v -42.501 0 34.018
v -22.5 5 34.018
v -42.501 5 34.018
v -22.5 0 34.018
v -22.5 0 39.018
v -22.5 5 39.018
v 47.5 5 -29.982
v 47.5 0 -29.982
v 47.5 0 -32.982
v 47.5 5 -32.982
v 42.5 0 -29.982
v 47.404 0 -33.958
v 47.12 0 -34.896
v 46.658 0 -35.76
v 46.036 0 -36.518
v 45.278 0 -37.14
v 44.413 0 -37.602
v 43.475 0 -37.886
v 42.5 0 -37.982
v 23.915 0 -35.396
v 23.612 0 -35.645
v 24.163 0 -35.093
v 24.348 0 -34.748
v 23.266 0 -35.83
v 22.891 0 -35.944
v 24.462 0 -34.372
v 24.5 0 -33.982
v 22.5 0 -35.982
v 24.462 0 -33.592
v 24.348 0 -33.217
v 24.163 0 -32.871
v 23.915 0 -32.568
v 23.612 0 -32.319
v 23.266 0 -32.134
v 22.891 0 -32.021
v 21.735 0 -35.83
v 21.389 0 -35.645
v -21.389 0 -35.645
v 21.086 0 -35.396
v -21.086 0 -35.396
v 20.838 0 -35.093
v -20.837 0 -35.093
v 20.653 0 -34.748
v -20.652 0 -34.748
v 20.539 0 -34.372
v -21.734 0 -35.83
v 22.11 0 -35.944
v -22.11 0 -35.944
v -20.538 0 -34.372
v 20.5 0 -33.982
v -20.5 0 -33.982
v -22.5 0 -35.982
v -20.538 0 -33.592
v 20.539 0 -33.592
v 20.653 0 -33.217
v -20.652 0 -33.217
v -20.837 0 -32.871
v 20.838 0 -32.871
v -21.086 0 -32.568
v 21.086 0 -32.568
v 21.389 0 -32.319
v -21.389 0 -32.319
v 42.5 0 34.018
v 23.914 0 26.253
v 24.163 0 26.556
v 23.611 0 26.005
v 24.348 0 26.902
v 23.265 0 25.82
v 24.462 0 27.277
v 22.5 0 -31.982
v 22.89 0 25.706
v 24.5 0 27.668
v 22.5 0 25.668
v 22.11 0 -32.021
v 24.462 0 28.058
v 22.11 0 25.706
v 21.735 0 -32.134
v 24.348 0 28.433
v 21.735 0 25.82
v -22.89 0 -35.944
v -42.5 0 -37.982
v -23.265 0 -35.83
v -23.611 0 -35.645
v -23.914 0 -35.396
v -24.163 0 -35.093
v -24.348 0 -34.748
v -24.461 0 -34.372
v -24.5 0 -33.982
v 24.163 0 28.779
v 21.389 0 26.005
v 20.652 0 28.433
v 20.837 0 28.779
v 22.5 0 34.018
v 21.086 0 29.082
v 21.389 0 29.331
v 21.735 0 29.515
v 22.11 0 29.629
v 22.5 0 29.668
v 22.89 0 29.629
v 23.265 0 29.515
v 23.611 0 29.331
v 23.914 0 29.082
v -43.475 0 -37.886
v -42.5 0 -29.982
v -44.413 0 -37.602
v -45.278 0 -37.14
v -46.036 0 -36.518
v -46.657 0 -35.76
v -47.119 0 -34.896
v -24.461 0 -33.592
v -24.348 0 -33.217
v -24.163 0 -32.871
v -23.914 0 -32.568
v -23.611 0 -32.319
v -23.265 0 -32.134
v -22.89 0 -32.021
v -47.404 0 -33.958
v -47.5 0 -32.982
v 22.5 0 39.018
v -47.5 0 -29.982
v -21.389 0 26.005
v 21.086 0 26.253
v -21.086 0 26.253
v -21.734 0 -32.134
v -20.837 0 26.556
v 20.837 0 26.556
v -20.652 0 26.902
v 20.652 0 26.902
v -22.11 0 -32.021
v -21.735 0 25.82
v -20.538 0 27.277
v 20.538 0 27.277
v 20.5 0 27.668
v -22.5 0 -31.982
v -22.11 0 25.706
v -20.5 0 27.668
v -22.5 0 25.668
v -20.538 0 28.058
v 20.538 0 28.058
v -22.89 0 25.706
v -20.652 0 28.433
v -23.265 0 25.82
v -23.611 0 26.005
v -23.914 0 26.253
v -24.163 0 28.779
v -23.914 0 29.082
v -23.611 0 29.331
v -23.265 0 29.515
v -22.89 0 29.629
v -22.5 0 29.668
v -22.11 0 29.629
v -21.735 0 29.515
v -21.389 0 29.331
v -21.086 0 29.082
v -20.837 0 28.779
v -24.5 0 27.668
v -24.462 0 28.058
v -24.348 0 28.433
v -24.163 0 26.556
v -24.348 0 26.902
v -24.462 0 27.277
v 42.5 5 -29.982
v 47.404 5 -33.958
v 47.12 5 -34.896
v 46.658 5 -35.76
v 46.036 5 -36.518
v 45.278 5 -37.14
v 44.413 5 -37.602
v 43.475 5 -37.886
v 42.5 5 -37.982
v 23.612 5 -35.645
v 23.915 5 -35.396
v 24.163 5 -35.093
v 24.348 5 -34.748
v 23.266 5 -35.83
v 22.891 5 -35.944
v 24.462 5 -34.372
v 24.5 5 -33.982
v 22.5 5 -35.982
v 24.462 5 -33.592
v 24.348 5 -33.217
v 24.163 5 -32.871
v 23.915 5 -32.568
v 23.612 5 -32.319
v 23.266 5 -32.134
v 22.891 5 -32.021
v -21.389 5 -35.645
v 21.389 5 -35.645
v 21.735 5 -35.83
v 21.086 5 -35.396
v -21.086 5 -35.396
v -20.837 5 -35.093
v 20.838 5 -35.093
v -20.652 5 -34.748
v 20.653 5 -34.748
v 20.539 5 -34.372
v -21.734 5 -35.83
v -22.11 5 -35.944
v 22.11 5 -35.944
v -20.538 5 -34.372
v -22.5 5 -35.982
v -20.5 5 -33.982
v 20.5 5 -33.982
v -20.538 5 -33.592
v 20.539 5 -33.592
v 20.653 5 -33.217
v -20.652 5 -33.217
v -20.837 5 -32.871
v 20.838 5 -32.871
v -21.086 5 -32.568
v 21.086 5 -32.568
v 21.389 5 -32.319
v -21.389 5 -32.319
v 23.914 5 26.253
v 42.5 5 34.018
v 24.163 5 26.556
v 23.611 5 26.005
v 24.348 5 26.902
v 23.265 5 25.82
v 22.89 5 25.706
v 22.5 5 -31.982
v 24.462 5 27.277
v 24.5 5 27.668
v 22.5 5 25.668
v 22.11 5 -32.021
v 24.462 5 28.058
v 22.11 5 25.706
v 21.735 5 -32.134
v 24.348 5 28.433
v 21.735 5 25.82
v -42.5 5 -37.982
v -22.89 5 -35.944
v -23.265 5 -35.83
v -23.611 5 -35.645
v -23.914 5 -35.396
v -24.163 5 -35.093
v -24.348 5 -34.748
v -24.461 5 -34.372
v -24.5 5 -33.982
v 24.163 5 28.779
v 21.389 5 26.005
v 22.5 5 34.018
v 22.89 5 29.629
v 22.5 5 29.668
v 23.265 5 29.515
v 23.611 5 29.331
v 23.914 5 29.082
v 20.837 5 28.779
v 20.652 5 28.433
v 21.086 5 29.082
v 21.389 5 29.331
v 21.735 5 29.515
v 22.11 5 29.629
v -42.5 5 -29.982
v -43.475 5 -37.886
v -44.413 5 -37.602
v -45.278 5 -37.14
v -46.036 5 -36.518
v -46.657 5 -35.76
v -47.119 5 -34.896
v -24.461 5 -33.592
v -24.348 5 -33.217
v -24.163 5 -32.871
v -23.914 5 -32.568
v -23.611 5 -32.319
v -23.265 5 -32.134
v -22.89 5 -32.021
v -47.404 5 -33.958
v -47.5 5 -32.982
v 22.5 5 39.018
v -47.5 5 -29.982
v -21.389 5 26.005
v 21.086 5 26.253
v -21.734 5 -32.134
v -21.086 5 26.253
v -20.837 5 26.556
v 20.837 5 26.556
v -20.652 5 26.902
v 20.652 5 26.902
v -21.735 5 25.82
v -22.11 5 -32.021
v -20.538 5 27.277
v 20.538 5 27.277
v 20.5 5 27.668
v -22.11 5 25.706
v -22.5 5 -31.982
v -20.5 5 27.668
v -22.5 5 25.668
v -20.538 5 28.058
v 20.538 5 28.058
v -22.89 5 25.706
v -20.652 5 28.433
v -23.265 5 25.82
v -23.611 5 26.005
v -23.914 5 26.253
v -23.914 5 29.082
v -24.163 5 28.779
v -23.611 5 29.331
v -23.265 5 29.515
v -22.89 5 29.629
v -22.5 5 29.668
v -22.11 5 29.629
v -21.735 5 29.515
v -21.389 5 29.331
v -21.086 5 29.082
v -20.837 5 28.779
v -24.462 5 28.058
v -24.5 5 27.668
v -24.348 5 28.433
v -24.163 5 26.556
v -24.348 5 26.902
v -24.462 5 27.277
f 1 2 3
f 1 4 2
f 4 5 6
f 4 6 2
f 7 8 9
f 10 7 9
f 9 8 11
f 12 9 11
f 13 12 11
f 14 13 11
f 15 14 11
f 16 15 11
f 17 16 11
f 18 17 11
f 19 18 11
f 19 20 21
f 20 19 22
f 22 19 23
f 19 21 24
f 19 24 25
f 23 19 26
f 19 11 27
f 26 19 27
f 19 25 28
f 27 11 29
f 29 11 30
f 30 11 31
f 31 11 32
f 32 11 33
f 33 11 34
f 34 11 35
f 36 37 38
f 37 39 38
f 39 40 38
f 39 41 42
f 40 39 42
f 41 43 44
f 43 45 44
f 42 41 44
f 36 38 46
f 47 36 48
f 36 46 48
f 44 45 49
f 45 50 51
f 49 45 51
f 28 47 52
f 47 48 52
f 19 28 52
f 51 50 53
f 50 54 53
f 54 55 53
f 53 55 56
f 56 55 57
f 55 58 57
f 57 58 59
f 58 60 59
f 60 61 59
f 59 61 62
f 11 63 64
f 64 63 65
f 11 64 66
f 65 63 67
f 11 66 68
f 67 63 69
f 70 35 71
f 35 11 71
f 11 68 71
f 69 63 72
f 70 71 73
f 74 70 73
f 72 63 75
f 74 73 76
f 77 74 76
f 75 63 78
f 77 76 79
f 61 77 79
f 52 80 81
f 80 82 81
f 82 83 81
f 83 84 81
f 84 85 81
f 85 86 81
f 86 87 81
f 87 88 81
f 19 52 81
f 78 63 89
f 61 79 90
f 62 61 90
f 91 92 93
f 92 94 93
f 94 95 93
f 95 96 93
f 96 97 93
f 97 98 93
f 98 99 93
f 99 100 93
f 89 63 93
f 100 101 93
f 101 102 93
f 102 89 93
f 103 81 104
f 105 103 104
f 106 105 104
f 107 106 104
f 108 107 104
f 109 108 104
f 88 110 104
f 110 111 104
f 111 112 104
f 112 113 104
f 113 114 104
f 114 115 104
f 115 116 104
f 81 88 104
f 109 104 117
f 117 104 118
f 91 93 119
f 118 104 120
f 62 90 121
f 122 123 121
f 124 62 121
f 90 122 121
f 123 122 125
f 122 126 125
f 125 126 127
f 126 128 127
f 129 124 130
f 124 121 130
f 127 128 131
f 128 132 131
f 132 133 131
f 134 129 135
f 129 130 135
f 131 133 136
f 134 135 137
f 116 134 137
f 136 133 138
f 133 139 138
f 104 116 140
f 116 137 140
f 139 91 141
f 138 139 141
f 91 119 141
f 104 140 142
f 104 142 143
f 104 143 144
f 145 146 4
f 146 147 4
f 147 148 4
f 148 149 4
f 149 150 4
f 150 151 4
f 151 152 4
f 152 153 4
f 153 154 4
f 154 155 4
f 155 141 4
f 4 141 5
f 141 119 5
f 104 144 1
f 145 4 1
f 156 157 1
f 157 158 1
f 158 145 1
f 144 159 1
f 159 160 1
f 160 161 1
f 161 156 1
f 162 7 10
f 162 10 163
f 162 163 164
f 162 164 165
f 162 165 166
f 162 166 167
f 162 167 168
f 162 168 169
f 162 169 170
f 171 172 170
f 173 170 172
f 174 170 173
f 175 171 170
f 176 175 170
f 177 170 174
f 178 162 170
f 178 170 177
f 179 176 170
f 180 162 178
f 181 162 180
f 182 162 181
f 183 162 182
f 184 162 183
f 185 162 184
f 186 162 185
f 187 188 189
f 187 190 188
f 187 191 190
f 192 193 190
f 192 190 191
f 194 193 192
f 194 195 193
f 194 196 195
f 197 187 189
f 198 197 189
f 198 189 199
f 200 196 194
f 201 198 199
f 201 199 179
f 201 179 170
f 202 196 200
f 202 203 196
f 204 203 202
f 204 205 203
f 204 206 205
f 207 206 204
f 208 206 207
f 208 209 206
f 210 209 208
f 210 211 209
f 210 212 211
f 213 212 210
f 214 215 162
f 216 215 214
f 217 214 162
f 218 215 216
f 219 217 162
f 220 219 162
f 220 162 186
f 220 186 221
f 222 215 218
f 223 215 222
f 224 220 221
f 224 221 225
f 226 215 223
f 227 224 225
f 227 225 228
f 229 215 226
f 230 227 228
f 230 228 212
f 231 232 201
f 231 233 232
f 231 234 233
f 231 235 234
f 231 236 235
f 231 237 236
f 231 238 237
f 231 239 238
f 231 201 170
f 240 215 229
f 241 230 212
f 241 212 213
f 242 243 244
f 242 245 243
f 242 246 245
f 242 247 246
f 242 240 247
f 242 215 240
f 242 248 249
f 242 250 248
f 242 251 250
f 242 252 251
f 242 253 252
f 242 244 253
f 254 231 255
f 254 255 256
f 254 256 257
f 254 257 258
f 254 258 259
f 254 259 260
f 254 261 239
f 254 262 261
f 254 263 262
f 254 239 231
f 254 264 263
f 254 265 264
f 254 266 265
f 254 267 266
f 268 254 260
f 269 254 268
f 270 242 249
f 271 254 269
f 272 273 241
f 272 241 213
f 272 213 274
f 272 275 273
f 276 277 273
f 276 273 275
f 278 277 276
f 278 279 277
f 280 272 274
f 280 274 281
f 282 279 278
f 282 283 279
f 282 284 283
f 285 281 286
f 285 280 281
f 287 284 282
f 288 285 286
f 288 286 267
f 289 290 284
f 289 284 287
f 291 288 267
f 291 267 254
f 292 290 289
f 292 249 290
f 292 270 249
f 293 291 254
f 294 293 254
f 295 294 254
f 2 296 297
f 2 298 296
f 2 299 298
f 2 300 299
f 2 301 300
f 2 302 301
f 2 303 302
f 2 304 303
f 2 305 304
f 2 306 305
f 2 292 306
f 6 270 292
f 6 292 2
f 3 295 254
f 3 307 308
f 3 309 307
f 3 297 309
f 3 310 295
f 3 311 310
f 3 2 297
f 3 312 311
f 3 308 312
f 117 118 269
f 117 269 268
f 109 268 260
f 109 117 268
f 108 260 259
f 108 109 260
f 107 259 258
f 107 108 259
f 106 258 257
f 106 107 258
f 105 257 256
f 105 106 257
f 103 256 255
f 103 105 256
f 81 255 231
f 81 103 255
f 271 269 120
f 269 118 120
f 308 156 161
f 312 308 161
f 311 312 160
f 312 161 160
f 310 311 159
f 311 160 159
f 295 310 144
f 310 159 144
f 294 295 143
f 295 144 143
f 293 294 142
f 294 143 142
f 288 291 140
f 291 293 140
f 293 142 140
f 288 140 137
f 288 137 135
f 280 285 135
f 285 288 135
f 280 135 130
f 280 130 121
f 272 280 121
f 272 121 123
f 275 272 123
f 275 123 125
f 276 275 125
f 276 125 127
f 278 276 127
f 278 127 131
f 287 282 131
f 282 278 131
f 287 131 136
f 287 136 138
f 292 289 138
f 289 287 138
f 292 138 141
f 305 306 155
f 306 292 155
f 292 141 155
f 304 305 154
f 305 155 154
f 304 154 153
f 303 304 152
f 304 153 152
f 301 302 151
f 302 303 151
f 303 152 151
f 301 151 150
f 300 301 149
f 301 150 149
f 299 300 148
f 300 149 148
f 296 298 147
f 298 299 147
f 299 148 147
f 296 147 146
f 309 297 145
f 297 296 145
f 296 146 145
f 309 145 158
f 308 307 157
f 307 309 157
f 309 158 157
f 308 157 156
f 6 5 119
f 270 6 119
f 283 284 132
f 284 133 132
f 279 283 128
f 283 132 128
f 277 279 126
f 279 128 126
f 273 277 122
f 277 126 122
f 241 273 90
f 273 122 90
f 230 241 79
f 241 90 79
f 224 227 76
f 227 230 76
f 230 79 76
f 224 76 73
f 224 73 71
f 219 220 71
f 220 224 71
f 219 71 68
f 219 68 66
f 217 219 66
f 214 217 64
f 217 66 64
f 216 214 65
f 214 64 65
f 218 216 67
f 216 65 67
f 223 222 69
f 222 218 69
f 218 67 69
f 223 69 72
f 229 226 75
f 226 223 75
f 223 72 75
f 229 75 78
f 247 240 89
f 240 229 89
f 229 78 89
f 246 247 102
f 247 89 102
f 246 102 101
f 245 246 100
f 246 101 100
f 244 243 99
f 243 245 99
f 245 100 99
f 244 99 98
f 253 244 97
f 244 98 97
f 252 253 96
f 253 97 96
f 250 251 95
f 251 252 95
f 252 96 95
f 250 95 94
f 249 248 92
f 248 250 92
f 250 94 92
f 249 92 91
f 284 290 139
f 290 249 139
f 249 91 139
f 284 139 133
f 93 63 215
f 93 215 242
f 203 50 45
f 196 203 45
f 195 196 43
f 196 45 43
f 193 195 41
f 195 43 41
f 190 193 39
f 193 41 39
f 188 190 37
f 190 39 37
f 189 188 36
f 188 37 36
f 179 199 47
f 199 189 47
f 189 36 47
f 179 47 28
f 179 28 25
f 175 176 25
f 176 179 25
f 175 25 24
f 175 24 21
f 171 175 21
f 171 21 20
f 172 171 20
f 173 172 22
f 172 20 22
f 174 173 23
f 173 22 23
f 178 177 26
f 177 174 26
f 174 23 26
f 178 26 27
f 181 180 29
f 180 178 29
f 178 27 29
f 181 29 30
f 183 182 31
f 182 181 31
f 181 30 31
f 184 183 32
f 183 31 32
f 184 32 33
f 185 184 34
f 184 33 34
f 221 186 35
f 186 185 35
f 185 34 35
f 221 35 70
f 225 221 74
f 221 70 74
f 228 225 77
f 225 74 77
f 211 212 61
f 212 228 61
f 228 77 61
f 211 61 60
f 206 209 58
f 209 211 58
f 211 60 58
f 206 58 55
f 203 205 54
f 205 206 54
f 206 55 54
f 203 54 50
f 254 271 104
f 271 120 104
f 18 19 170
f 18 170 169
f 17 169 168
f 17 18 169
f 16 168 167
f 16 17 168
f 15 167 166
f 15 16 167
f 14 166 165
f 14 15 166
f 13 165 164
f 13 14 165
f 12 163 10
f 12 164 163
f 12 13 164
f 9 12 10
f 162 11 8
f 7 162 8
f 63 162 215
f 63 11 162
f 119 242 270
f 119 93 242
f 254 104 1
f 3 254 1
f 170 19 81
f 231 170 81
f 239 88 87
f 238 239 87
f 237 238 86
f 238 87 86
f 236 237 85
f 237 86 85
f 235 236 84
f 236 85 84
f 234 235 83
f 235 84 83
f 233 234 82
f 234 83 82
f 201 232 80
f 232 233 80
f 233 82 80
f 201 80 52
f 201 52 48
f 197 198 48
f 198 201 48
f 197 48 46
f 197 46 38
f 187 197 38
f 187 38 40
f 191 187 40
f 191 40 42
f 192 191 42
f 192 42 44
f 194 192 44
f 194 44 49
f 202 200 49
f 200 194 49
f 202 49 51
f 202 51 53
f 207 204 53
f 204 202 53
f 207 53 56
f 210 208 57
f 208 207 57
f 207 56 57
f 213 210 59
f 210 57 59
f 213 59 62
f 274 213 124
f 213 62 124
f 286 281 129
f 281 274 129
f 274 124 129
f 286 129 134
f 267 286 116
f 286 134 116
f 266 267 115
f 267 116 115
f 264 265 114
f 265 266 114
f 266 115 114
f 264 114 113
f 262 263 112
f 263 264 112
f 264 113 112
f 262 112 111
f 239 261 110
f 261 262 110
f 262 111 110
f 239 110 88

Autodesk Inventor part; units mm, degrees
ref_plane "YZ Plane" through (0, 0, 0) normal (1, 0, 0) x (0, 1, 0)
ref_plane "XZ Plane" through (0, 0, 0) normal (0, 1, 0) x (-1, 0, 0)
ref_plane "XY Plane" through (0, 0, 0) normal (0, 0, 1) x (1, 0, 0)
sketch "Sketch1" plane through (22.5, 0, 39.0178) normal (0, 1, 0) x (-1, 0, 0)
  line L0 (0.0005, -5) -> (0.0005, 0)
  line L1 (45.0005, 0) -> (0.0005, 0)
  line L2 (45.0005, 0) -> (45.0005, -5)
  circle A0 centre (-0.0005, -73) radius 2
  circle A1 centre (0, -11.3502) radius 2
  circle A2 centre (45, -11.3502) radius 2
  circle A3 centre (44.9998, -73) radius 2
  line L3 (-20, -5) -> (0.0005, -5)
  line L4 (45.0005, -5) -> (65.0008, -5)
  line L5 (-20, -69) -> (-25.0002, -69)
  line L6 (-25.0002, -69) -> (-25.0002, -72)
  arc A4 (-25.0002, -72) -> (-20, -77) centre (-20.0002, -72) ccw
  line L7 (-20, -77) -> (65, -77)
  arc A5 (65, -77) -> (70, -72) centre (65, -72) ccw
  line L8 (70, -72) -> (70, -69)
  line L9 (70, -69) -> (64.9998, -69)
  line L10 (-20, -69) -> (-20, -5)
  line L11 (64.9998, -69) -> (65.0008, -5)
  point P0 (-25.0005, -77)
  point P1 (11.4357, -9.3722)
  dimension "d5" = 4
  dimension "d1" = 4
  dimension "d0" = 4
extrude "Bottom Base" add sketch "Sketch1" along normal blind 5
properties part number "Bottom Base"
